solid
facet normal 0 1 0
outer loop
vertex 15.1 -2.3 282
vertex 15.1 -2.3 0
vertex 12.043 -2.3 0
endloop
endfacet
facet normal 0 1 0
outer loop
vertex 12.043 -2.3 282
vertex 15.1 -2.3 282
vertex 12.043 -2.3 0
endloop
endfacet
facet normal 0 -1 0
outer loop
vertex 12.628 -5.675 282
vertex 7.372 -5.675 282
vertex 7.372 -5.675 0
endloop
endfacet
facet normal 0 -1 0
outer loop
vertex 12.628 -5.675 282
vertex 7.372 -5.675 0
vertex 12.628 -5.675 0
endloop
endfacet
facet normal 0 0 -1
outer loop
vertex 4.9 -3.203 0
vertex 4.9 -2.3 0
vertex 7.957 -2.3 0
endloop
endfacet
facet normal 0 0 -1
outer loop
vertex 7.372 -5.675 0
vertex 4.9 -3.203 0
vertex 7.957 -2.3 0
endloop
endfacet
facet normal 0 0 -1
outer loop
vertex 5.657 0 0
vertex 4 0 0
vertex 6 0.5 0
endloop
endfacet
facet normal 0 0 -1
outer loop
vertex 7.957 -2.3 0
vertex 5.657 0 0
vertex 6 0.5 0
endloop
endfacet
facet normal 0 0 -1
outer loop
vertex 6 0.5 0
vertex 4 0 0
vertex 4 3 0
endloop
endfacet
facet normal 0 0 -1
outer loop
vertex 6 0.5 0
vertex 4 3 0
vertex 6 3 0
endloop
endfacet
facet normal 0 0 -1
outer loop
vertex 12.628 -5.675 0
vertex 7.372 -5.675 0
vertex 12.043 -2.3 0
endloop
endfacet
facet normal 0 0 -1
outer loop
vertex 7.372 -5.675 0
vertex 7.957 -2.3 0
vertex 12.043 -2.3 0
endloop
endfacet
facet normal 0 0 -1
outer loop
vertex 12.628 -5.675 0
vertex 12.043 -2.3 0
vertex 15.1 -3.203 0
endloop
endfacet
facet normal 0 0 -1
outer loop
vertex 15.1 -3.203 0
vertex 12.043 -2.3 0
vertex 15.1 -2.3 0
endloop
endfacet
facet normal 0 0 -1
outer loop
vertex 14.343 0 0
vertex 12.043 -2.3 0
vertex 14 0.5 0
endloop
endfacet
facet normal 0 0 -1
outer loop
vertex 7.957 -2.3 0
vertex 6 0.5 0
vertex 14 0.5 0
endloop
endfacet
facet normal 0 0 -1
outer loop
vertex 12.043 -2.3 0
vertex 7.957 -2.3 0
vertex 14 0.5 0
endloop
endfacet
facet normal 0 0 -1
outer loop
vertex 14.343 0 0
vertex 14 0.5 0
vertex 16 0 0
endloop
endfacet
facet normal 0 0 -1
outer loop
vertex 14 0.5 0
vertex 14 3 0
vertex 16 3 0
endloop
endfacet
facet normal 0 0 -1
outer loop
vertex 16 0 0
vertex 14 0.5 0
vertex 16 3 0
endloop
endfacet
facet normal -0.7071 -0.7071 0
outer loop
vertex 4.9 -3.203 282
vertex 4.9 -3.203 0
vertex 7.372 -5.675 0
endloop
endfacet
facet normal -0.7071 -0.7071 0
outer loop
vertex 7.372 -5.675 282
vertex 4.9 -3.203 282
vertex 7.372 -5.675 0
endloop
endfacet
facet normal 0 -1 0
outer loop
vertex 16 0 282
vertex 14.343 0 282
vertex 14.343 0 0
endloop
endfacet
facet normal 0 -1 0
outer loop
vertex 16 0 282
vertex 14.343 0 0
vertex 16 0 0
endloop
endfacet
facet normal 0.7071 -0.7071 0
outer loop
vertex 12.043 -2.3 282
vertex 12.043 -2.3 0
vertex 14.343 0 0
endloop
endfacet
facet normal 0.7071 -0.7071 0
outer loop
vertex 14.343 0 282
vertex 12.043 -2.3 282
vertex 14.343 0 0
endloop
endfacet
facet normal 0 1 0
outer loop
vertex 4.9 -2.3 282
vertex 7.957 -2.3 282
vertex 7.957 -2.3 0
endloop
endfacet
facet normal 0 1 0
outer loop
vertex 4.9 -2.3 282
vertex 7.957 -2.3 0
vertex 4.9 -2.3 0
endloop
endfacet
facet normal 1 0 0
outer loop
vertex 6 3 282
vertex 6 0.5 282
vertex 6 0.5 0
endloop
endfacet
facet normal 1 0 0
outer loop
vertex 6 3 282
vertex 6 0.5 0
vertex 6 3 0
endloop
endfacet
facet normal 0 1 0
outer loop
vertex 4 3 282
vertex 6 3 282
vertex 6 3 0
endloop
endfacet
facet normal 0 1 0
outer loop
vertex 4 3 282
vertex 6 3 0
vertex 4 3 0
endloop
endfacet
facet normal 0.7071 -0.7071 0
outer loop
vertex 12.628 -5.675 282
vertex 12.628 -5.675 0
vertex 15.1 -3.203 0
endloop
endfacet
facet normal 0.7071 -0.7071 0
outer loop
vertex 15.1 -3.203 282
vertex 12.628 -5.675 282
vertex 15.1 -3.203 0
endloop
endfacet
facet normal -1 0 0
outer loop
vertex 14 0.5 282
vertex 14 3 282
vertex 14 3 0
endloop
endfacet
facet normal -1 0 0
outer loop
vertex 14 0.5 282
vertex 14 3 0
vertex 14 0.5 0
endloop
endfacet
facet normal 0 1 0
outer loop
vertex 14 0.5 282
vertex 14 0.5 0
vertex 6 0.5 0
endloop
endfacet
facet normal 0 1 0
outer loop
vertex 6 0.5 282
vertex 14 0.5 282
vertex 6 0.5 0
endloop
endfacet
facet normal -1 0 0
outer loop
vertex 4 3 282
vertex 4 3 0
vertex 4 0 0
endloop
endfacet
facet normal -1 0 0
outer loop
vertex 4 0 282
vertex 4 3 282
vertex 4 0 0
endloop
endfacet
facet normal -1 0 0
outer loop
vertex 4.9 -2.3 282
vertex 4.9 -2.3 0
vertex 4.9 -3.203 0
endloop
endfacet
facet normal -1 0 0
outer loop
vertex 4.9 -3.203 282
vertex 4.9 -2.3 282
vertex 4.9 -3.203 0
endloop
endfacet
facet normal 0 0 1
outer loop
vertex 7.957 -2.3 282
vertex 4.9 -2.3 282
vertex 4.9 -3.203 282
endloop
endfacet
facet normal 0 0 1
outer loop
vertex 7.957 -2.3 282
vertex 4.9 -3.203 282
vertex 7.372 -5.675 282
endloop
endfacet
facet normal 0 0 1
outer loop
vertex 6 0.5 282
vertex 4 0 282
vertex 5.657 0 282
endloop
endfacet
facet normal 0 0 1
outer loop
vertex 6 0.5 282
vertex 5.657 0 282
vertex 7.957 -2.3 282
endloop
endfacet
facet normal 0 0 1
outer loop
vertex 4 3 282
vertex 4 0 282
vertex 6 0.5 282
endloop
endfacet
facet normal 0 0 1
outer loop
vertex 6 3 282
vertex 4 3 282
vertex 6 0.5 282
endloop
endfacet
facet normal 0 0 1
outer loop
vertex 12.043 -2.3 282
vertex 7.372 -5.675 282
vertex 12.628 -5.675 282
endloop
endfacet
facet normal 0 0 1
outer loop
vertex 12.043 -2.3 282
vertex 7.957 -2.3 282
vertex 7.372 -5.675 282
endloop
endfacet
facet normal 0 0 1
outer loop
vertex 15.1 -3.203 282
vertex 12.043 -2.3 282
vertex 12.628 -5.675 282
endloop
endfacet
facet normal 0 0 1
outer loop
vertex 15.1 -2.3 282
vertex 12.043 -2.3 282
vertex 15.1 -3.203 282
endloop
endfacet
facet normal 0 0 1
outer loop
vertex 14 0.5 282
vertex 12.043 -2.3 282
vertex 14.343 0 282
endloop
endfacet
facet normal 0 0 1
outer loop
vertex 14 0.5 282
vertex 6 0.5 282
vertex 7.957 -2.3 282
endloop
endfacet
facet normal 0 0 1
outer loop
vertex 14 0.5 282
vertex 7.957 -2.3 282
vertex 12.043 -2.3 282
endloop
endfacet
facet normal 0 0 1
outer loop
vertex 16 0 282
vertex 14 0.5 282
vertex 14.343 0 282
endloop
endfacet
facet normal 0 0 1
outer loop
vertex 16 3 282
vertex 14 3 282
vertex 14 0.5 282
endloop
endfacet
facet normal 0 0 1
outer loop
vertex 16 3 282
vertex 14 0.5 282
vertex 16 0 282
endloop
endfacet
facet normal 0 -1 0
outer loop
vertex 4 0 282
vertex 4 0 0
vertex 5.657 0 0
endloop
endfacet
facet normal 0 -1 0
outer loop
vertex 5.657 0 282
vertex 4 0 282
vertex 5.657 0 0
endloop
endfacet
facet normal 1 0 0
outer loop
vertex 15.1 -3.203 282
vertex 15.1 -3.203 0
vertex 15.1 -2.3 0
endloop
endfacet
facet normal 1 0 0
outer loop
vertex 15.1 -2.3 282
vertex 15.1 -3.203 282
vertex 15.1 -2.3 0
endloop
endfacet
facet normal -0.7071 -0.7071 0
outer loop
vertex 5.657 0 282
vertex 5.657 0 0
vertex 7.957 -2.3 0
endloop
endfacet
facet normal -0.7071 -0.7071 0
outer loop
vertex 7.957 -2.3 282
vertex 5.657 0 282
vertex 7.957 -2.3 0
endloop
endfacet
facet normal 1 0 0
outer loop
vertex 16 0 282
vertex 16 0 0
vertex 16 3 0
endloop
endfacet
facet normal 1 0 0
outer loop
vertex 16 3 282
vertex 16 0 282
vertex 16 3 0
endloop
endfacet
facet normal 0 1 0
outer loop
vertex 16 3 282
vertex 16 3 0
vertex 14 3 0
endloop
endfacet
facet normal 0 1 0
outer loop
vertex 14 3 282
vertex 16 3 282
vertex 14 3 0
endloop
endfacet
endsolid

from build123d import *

# Parameters (mm, degrees)
SALIENTE_EXTRUIR1_DEPTH = 282


with BuildPart() as part:
    # Croquis1 → Saliente-Extruir1 (new body)
    with BuildSketch(Plane.XY):
        Polygon((7.372056275, -5.675), (10, -5.675), (10, 0.5), (6, 0.5), (6, 3), (4, 3), (4, 0), (4.4, 0), (4.95, 0), (5.657106781, 0), (7.957106781, -2.3), (4.9, -2.3), (4.9, -3.202943725), align=None)
        Polygon((10, -5.675), (12.627943725, -5.675), (15.1, -3.202943725), (15.1, -2.3), (12.042893219, -2.3), (14.342893219, 0), (16, 0), (16, 3), (14, 3), (14, 0.5), (10, 0.5), align=None)
    extrude(amount=SALIENTE_EXTRUIR1_DEPTH)


solid = part.part
